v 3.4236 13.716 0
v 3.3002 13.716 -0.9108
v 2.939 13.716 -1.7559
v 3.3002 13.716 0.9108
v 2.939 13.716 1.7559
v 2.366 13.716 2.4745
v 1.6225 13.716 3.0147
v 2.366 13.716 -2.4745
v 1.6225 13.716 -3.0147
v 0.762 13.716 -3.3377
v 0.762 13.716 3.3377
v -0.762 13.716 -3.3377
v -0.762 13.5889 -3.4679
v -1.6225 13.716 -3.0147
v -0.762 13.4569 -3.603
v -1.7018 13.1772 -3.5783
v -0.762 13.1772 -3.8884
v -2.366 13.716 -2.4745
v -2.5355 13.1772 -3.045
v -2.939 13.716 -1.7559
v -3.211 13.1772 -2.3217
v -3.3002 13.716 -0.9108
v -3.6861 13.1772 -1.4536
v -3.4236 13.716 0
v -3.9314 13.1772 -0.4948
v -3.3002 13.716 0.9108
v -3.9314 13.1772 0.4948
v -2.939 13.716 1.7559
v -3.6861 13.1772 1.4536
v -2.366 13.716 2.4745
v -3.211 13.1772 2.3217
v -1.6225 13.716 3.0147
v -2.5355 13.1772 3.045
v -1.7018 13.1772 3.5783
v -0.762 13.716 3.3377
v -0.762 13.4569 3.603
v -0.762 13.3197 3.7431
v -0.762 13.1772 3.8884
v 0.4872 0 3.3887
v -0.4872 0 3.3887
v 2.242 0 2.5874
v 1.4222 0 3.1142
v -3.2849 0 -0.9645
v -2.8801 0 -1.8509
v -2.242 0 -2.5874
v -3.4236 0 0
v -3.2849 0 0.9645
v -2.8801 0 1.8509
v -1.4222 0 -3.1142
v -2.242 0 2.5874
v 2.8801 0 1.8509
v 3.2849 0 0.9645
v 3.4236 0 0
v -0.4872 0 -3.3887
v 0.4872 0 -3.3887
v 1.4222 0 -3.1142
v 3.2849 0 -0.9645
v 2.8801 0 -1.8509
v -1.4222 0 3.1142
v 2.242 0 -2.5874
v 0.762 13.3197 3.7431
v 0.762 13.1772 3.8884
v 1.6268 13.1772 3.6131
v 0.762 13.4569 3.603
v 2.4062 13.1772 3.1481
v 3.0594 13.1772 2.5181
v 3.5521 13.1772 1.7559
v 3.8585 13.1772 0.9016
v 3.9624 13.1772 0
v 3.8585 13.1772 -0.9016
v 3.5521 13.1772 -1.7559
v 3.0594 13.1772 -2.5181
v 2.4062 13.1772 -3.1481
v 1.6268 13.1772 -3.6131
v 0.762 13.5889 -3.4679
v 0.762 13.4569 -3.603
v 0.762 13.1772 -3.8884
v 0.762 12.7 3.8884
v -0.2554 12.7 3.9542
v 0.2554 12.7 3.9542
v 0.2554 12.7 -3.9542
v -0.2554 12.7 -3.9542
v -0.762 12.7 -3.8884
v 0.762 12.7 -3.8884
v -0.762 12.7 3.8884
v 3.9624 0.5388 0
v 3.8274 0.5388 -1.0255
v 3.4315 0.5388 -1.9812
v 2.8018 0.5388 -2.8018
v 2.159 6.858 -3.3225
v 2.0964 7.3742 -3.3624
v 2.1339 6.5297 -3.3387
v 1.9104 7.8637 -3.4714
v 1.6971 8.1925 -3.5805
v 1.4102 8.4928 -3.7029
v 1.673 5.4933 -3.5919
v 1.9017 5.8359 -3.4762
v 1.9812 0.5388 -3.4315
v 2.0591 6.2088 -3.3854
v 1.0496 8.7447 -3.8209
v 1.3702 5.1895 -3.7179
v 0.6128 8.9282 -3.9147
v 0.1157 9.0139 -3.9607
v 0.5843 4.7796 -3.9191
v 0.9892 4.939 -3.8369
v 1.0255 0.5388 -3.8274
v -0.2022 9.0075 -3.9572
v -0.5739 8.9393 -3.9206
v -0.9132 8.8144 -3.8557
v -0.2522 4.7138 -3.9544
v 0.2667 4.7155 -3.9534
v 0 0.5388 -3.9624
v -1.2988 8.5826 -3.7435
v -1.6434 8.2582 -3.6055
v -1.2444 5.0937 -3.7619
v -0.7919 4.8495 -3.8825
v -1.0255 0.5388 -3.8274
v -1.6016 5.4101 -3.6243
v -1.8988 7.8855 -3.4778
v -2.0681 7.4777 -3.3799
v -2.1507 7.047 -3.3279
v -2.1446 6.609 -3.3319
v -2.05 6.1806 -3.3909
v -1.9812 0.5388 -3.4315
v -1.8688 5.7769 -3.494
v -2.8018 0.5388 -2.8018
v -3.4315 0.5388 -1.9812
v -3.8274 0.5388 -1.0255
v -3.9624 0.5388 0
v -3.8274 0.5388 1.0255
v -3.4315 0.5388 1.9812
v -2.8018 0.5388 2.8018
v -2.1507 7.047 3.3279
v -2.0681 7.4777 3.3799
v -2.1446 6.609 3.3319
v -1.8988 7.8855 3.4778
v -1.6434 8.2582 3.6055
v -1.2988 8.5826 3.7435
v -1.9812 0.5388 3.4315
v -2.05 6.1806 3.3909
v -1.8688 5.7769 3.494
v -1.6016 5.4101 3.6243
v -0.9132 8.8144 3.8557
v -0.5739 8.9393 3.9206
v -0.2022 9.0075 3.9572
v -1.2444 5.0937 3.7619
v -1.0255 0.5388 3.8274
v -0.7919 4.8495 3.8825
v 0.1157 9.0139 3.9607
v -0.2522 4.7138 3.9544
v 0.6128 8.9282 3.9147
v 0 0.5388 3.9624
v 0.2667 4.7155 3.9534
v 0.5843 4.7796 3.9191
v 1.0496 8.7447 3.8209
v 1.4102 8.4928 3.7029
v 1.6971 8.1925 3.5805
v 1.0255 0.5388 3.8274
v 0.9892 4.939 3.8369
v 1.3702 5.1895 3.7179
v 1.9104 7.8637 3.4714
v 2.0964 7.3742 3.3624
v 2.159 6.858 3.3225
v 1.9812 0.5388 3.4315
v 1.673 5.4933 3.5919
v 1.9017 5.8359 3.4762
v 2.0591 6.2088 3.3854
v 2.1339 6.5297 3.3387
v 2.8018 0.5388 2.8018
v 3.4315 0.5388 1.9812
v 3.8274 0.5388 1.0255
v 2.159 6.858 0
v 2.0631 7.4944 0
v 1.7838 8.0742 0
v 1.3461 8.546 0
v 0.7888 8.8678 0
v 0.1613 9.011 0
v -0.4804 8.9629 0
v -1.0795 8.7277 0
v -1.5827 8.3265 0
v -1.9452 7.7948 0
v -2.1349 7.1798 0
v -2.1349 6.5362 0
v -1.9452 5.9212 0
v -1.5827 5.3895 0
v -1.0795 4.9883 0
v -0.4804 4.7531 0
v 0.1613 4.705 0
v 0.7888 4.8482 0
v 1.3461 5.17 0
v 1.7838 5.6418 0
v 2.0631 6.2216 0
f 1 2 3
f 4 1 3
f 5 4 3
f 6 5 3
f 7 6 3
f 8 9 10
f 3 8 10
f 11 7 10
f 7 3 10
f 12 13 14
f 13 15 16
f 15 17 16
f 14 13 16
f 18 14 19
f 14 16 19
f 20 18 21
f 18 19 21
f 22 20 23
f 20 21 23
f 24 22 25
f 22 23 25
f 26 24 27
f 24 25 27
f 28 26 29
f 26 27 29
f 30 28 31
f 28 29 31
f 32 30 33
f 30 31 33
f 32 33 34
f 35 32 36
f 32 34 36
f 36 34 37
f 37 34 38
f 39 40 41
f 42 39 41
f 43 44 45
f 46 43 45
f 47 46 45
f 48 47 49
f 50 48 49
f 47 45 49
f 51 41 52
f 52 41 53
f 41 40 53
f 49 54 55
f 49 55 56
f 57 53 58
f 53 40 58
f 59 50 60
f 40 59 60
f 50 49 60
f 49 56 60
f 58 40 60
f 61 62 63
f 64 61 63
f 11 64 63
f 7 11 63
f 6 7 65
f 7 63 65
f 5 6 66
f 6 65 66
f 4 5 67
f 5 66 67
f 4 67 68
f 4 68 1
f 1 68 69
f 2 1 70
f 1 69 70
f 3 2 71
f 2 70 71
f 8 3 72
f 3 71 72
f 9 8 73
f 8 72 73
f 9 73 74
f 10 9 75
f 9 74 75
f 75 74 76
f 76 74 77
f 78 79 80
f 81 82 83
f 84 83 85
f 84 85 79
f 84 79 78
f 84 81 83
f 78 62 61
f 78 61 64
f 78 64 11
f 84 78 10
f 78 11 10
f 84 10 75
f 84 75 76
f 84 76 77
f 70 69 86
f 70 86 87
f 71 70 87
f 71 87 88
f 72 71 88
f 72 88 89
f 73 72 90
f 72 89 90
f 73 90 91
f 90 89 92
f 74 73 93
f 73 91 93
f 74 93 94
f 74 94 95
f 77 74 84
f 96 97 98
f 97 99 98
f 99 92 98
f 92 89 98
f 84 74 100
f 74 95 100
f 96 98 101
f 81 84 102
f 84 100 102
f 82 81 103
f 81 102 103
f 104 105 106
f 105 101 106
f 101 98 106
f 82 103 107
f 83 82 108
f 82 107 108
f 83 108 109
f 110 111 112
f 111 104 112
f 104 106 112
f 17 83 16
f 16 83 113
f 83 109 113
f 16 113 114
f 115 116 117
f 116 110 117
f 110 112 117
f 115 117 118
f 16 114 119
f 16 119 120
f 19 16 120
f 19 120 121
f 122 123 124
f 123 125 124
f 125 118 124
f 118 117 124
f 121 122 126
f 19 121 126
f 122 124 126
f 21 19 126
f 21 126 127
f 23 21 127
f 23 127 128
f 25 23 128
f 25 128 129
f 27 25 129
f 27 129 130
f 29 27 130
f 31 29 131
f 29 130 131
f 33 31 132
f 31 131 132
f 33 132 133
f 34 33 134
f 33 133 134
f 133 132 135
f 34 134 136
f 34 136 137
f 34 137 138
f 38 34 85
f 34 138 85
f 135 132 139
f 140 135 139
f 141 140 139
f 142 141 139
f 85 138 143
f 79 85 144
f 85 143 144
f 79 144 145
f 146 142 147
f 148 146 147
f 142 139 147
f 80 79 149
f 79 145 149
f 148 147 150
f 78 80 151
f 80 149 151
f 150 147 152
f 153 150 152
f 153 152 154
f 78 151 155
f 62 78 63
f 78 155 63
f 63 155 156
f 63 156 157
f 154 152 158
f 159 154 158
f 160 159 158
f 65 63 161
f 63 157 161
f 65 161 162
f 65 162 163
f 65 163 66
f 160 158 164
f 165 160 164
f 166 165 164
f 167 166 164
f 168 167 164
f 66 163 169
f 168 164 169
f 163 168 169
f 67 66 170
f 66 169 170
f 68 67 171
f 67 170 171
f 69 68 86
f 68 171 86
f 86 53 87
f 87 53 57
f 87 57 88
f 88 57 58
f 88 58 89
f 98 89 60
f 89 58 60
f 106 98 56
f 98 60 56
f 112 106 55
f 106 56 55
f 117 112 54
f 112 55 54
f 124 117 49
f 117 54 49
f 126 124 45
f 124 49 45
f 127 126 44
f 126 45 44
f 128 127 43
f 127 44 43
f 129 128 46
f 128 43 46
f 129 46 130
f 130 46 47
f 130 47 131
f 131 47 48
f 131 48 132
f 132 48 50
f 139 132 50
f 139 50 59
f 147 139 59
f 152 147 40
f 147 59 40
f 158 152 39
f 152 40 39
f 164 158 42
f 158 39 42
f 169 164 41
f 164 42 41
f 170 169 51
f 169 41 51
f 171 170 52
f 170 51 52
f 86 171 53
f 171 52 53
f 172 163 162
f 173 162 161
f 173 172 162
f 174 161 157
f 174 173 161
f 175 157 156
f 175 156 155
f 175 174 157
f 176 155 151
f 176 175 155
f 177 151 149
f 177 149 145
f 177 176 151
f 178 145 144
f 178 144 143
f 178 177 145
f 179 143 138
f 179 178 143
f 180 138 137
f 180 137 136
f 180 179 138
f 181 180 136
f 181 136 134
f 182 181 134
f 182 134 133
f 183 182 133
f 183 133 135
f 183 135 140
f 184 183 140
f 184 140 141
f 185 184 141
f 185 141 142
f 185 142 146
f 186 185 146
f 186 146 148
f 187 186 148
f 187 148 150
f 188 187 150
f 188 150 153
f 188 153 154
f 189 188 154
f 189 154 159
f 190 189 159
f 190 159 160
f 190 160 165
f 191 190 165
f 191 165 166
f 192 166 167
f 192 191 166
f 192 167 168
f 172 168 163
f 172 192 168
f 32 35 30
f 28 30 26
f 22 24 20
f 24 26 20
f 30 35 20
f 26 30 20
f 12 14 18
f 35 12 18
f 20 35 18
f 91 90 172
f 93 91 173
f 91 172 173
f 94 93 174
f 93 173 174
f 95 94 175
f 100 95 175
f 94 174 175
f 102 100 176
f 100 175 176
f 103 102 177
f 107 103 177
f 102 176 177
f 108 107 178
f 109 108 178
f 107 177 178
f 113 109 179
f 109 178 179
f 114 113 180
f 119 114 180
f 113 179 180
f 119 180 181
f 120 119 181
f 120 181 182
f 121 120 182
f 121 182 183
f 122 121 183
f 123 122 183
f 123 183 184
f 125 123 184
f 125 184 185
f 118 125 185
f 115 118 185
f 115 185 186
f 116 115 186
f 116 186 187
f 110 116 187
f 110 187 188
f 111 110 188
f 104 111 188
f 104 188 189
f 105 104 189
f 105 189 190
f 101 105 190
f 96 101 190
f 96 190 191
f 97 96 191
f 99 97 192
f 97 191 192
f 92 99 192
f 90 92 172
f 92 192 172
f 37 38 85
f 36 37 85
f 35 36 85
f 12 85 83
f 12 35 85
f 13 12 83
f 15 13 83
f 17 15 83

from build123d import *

# Parameters (mm, degrees)
SKETCH4_W               = 1.524
SKETCH4_H               = 9.039794808
CUT_EXTRUDE2_DEPTH      = 1.016
SKETCH9_R               = 2.159
CUT_EXTRUDE3_DEPTH      = 4.9624
CUT_EXTRUDE3_DEPTH_BACK = 4.9624


with BuildPart() as part:
    # Sketch3 → Revolve1 (revolve)
    with BuildSketch(Plane.XY):
        Polygon((3.423584633, 13.716), (3.9624, 13.177184633), (3.9624, 0.538815367), (3.423584633, 0), (0, 0), (0, 13.716), align=None)
    revolve(axis=Axis((0, 0, 0), (0, 1, 0)))

    # Sketch4 → Cut-Extrude2 (cut)
    with BuildSketch(Plane(origin=(0, 13.716, 0), x_dir=(1, 0, 0), z_dir=(0, 1, 0))):
        with Locations((0, -0.098453211)):
            Rectangle(SKETCH4_W, SKETCH4_H)
    extrude(amount=-CUT_EXTRUDE2_DEPTH, mode=Mode.SUBTRACT)

    # Sketch9 → Cut-Extrude3 (cut, two sides)
    with BuildSketch(Plane.XY) as cut_extrude3_sk:
        with Locations((0, 6.858)):
            Circle(SKETCH9_R)
    extrude(amount=CUT_EXTRUDE3_DEPTH, mode=Mode.SUBTRACT)
    extrude(cut_extrude3_sk.sketch, amount=-CUT_EXTRUDE3_DEPTH_BACK, mode=Mode.SUBTRACT)


solid = part.part
